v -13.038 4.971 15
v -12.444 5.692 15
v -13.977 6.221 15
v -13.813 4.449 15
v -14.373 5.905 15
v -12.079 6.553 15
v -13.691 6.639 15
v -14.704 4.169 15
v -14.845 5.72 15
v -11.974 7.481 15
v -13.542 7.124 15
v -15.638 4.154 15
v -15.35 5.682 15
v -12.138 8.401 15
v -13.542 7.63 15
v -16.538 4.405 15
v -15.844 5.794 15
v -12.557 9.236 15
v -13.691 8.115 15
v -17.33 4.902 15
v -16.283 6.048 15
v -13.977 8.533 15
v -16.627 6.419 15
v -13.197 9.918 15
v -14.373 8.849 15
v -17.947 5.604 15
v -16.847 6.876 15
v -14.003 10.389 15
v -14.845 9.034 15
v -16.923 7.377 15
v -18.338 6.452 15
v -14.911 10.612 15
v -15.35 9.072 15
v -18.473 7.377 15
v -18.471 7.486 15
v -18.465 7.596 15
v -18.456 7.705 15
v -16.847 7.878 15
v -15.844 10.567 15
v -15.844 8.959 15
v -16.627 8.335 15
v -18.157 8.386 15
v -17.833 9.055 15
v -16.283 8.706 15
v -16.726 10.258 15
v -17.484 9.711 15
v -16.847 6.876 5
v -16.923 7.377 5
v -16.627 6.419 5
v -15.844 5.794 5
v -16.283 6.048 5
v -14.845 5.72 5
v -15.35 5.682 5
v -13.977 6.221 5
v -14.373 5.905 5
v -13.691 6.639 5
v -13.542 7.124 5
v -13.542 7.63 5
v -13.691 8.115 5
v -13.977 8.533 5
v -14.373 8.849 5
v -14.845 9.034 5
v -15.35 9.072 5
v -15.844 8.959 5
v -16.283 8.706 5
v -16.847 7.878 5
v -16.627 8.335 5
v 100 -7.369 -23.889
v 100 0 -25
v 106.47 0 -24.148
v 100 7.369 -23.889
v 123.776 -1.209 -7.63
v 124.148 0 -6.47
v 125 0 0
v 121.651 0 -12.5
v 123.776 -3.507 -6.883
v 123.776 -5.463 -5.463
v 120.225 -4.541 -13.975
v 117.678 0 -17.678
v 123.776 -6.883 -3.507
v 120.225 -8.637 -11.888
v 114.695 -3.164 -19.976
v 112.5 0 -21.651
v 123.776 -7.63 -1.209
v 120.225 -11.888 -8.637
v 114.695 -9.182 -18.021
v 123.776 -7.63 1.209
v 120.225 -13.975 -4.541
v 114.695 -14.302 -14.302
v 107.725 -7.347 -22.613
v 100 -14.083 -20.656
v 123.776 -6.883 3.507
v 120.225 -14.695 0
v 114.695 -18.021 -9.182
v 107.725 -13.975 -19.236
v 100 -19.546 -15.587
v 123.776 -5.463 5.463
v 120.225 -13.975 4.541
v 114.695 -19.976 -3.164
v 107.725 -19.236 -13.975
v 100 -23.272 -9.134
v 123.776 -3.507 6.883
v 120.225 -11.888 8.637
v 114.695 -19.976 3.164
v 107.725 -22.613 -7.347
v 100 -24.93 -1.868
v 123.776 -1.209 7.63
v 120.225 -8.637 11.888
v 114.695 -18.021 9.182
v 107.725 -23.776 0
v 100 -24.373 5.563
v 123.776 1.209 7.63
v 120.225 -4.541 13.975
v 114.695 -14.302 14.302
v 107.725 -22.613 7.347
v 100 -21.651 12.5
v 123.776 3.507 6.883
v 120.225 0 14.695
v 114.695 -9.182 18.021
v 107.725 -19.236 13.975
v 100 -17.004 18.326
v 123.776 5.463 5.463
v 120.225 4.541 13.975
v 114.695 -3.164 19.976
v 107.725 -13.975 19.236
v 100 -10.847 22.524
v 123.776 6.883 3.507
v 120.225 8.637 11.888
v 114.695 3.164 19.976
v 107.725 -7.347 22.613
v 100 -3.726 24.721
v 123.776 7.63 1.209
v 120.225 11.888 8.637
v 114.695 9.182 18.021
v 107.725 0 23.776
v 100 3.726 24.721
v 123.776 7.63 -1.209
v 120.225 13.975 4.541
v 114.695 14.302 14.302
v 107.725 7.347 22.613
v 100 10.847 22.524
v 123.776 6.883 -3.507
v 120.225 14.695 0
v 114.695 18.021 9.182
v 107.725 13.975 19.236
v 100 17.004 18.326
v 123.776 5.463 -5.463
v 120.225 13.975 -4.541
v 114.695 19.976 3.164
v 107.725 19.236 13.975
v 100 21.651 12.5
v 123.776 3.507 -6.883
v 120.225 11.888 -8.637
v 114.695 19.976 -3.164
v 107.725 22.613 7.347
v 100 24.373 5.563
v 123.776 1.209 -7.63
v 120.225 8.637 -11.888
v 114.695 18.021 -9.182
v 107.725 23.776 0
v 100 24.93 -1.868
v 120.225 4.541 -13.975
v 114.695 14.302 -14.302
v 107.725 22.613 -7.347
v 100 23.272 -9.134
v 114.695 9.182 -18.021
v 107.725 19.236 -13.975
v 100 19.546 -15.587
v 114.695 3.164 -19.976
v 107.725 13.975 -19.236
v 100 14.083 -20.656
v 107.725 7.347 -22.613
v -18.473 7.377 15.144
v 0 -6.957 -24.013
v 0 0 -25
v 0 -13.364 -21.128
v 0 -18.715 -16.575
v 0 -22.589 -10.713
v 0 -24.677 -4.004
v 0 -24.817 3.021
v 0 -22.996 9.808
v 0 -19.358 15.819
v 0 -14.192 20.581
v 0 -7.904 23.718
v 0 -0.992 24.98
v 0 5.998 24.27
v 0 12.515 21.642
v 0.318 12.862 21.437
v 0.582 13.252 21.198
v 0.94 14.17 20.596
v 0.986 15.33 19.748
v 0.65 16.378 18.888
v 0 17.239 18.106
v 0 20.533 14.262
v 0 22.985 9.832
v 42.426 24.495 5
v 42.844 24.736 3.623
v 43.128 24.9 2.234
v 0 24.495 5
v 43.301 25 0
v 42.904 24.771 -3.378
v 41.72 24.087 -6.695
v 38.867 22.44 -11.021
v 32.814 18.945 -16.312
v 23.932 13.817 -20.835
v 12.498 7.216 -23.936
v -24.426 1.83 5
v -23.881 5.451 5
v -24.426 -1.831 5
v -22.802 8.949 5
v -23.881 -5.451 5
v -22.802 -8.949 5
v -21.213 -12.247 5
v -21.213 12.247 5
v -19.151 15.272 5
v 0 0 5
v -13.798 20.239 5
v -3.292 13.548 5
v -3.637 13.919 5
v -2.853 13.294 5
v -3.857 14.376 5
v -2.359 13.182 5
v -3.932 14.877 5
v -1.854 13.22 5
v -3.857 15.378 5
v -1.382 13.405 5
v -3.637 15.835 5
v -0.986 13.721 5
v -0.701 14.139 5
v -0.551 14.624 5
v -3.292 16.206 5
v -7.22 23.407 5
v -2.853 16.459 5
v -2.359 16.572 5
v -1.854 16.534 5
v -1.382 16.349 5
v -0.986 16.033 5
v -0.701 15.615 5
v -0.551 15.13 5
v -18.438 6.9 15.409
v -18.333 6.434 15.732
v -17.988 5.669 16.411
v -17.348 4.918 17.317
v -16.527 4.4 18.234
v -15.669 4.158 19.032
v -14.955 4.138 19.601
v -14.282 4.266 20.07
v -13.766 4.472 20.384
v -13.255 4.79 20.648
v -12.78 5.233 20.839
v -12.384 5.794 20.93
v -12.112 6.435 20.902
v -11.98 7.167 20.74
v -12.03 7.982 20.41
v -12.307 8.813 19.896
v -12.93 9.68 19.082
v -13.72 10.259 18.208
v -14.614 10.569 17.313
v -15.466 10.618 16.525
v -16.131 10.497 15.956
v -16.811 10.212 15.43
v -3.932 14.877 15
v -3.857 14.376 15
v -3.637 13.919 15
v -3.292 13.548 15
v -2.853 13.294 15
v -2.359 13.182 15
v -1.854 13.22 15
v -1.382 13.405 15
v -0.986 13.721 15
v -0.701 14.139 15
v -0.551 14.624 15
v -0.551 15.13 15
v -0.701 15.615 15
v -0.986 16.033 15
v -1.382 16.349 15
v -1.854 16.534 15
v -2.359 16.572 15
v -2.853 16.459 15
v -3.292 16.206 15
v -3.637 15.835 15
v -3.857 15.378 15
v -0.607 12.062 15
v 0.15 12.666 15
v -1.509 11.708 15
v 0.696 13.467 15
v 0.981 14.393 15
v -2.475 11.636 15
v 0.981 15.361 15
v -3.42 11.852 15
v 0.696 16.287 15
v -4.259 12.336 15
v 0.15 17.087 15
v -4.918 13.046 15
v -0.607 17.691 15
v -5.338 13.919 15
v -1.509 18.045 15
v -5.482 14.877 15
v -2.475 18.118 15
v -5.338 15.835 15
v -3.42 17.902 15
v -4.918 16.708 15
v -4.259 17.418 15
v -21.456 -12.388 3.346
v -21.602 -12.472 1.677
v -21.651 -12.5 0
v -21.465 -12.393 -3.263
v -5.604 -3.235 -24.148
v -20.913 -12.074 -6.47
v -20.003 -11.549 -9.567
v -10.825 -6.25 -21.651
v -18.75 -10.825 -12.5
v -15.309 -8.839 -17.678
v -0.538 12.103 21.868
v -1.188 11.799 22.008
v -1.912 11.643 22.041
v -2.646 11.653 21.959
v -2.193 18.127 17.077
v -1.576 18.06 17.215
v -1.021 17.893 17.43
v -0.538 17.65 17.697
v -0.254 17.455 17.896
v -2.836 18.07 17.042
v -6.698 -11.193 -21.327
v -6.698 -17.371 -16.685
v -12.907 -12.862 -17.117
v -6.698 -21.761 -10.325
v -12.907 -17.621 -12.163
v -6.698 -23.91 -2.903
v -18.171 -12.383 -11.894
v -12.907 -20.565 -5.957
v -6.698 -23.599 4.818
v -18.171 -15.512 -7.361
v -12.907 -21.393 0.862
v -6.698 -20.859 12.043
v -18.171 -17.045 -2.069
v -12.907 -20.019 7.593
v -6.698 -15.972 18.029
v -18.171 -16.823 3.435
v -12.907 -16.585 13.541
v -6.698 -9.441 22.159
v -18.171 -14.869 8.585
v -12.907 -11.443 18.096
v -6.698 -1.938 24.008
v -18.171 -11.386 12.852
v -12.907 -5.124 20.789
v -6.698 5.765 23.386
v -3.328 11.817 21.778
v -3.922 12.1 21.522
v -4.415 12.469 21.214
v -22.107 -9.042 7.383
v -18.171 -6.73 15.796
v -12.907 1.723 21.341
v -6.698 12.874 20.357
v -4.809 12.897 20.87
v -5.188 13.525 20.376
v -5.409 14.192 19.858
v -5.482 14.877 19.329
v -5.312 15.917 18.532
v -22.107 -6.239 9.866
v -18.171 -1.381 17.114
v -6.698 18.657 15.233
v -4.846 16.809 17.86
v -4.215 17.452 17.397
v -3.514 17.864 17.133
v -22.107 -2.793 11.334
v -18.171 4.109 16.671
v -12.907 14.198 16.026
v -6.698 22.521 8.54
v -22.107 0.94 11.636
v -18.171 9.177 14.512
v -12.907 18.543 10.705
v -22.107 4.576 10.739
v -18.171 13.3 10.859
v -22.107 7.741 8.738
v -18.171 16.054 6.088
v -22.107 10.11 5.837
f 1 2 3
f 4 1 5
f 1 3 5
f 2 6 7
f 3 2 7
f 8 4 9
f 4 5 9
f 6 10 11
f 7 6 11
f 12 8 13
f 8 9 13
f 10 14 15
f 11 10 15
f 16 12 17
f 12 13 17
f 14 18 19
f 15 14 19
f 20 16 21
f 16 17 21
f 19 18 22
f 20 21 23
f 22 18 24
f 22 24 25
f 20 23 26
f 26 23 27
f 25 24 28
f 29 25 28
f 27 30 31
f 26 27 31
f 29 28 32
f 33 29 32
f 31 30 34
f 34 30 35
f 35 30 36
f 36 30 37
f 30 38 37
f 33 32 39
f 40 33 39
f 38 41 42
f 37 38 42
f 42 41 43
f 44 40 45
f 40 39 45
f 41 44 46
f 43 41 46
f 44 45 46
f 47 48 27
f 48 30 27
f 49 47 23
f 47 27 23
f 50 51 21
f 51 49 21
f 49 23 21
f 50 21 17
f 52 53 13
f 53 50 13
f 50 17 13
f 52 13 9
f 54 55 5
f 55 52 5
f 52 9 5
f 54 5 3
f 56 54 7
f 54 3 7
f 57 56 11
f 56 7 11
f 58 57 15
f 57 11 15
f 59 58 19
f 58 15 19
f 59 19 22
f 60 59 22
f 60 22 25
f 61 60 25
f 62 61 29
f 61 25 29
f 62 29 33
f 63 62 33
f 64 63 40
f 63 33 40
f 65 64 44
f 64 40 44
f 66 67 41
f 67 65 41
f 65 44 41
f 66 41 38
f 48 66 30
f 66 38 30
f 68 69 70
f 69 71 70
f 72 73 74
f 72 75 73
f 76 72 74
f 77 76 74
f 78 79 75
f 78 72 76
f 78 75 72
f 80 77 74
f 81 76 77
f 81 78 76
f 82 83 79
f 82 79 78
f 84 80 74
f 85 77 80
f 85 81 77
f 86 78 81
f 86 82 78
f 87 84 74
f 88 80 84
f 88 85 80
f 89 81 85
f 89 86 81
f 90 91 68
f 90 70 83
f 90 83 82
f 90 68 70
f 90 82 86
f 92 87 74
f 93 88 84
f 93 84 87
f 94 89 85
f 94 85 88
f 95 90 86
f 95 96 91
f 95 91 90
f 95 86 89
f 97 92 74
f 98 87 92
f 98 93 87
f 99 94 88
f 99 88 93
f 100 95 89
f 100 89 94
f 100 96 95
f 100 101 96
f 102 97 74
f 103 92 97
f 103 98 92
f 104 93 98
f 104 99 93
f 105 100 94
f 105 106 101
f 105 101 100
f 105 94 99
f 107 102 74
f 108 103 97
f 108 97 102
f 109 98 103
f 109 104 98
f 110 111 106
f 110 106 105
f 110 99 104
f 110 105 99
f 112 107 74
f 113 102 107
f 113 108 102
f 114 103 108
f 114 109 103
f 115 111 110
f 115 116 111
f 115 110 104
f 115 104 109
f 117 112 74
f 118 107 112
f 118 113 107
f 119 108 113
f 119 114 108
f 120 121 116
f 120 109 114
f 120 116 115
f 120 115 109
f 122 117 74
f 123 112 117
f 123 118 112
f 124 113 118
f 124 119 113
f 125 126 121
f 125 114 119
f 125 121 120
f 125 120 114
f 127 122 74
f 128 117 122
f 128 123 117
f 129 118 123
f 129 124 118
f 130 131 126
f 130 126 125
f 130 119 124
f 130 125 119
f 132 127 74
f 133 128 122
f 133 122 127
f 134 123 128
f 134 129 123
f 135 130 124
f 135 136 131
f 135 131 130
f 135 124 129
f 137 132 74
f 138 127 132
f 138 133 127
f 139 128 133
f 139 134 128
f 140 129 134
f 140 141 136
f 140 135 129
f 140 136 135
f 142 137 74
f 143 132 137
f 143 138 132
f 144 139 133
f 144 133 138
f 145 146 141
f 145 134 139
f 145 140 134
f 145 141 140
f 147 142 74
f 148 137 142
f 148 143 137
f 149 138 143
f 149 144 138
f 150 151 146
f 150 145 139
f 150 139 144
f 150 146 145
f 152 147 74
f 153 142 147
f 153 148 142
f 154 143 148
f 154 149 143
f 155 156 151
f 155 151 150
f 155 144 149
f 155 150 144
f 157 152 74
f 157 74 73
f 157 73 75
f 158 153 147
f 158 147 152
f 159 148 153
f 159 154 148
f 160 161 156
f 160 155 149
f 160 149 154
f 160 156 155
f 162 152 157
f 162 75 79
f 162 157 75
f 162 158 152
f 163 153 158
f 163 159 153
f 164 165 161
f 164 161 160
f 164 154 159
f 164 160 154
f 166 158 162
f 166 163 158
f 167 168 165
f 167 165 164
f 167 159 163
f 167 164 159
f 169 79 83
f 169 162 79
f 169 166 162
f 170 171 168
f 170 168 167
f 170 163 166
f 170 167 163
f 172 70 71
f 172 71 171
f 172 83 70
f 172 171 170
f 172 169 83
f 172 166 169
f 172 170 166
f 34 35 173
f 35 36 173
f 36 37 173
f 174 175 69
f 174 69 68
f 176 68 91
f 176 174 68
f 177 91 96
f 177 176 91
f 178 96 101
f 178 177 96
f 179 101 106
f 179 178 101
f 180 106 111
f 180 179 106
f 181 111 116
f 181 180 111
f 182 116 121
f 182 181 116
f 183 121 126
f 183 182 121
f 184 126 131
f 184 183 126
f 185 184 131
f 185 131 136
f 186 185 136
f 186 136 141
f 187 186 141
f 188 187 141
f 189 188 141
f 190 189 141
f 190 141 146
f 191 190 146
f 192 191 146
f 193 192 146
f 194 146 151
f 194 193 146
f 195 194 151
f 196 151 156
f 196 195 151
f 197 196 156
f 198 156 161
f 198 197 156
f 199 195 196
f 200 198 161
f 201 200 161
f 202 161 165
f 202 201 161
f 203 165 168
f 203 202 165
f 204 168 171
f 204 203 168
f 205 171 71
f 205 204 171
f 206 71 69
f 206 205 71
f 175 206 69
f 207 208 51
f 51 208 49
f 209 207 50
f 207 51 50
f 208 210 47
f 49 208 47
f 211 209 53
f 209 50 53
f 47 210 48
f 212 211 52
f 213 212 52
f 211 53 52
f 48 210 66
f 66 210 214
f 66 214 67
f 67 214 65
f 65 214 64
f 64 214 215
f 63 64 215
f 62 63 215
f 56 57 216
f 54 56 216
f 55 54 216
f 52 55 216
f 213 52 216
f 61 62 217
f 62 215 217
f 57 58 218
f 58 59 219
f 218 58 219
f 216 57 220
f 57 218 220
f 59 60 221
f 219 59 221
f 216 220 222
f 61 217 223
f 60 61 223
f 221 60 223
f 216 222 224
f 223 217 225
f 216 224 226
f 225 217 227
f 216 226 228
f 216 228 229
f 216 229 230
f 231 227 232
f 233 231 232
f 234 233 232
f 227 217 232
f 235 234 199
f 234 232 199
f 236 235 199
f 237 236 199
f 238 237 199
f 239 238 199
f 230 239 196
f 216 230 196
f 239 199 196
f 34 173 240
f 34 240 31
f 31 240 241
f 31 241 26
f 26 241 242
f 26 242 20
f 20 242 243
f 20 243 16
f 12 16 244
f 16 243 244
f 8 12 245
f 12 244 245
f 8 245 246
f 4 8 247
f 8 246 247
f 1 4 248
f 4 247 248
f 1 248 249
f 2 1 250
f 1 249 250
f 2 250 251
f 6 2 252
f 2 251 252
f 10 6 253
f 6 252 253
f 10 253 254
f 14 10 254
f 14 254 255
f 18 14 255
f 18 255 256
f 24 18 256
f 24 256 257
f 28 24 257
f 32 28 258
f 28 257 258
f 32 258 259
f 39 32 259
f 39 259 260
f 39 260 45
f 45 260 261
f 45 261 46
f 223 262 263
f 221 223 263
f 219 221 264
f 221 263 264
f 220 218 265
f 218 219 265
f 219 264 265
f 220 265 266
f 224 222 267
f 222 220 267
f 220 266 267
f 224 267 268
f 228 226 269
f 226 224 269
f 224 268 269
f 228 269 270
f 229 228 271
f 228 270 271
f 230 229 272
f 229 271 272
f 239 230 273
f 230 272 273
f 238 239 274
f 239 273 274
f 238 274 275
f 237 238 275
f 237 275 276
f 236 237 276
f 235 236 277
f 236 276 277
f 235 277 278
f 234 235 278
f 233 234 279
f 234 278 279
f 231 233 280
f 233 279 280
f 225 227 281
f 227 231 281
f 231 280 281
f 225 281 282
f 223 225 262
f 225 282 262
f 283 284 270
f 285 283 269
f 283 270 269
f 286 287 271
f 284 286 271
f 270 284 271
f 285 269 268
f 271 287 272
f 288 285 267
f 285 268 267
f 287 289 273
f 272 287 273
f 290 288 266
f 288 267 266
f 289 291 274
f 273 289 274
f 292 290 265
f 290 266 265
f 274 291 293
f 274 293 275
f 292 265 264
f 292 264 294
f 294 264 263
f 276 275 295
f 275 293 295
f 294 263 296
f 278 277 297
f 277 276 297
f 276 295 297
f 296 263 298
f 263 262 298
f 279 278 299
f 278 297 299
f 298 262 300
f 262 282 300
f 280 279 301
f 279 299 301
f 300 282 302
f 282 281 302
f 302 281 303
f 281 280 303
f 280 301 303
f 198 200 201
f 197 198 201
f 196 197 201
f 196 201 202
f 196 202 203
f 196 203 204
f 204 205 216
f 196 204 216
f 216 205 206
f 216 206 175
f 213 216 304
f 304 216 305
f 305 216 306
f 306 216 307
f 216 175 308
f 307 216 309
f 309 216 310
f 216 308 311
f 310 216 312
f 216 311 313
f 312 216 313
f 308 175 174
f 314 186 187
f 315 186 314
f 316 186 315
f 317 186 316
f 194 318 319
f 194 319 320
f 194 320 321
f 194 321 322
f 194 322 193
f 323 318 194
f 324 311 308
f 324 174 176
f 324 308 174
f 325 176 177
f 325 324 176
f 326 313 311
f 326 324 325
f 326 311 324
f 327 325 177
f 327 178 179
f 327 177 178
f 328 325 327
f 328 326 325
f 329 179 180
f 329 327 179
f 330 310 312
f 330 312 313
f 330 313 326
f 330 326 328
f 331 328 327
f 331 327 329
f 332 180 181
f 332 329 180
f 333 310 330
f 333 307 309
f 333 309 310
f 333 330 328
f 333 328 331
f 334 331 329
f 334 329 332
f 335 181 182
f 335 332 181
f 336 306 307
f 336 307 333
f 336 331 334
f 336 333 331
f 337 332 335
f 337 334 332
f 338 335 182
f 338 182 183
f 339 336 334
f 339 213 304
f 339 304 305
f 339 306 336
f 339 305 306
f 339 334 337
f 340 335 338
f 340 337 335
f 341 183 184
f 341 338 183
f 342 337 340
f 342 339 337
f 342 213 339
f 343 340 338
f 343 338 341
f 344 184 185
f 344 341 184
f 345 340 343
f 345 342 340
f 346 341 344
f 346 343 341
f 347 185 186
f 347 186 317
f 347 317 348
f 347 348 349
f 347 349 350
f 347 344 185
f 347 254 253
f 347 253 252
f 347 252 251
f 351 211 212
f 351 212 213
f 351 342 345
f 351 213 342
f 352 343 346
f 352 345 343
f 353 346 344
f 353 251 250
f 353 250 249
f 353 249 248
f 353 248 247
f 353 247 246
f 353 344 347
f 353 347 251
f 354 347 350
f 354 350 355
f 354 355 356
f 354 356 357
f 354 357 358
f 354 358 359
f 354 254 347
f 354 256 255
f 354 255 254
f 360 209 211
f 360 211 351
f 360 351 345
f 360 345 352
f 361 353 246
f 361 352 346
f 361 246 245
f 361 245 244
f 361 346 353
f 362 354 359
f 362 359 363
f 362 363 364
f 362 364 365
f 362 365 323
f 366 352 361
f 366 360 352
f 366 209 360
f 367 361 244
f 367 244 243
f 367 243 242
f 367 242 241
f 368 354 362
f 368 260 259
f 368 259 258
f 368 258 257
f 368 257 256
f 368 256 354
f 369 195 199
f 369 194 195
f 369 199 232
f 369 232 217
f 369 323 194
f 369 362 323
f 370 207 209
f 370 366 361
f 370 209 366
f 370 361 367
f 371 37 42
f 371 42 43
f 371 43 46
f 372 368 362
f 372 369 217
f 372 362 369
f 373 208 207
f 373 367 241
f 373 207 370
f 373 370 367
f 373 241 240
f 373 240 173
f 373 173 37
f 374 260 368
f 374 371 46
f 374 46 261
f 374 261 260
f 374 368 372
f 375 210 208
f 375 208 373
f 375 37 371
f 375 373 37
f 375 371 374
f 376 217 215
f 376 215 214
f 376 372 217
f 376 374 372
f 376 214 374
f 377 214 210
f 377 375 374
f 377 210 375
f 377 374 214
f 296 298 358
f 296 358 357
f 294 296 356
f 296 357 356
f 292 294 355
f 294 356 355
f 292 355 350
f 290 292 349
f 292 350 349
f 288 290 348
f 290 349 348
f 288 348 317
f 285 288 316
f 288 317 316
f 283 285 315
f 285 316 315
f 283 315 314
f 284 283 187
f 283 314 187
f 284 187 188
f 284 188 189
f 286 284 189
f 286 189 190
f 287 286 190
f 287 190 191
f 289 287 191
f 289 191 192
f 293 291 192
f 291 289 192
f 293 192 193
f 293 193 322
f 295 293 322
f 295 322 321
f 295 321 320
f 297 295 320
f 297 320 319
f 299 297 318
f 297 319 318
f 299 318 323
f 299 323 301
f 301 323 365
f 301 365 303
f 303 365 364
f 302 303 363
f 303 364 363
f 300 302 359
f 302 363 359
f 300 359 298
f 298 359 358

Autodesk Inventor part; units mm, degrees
ref_plane "YZ Plane" through (0, 0, 0) normal (1, 0, 0) x (0, 1, 0)
sketch "Esquisse1" plane through (0, 0, 0) normal (0, 1, 0) x (-1, 0, 0)
  line L0 (0, 0) -> (-100, 0)
  line L1 (-100, 0) -> (-100, -25)
  line L2 (-100, -25) -> (0, -25)
  line L3 (0, -25) -> (0, 0)
  arc A0 (0, -25) -> (25, 0) centre (0, 0) ccw
  line L4 (25, 0) -> (0, 0)
  line L5 (0, 0) -> (0, -25)
  line L6 (-100, 0) -> (-100, -25)
  arc A1 (-125, 0) -> (-100, -25) centre (-100, 0) ccw
  line L7 (-100, 0) -> (-125, 0)
  dimension "d1" = 25
  dimension "d2" = 100
revolve "Révolution1" add sketch "Esquisse1" angle 360 about axis through (0, 0, 0) along (1, 0, 0)
ref_plane "Plan de construction1" through (50, 0, -25) normal (0, 0, 1) x (1, 0, 0)
sketch "Esquisse2" plane through (50, 0, -25) normal (0, 0, 1) x (1, 0, 0)
  arc A0 (-50, 25) -> (-50, -25) centre (-50, 0) ccw projected
  line L0 (-50, 0) -> (-71.6506, -12.5)
  line L1 (-71.6506, -12.5) -> (-84.1506, 9.1506)
  line L2 (-84.1506, 9.1506) -> (-62.5, 21.6506)
  line L3 (-62.5, 21.6506) -> (-50, 0)
  line L4 (-50, 0) -> (-31.3481, 0) construction
  line L5 (-50, 0) -> (-62.5, 21.6506)
  line L6 (-62.5, 21.6506) -> (-19.1987, 46.6506)
  line L7 (-19.1987, 46.6506) -> (-6.6987, 25)
  line L8 (-6.6987, 25) -> (-50, 0)
  line L9 (-50, -25) -> (-50, 25) construction
  line L10 (-50, 25) -> (75, 25) construction
  line L11 (-50, 25) -> (50, 25) construction
  dimension "d9" = 120
extrude "Extrusion1" cut sketch "Esquisse2" along normal blind 30
ref_plane "Plan de construction2" through (50, 0, 35) normal (0, 0, -1) x (-1, 0, 0)
sketch "Esquisse3" plane through (50, 0, 35) normal (0, 0, -1) x (-1, 0, 0)
  line L0 (50, 0) -> (71.2132, -12.2474) construction
  line L1 (71.2132, -12.2474) -> (50, 0) construction
  line L2 (50, 0) -> (50, 0) construction
  line L3 (65.2228, 7.3769) -> (52.2324, 14.8769) construction
  circle A0 centre (65.2228, 7.3769) radius 1.7
  circle A1 centre (52.2324, 14.8769) radius 1.7
  line L4 (71.2132, -12.2474) -> (93.5005, 26.3552) construction
  line L5 (52.2324, 14.8769) -> (45.2324, 2.7526) construction
  line L6 (6.6987, 25) -> (-50, 25) construction
  dimension "d12" = 14
  dimension "d22" = 3.4
  dimension "d23" = 3.4
  dimension "d30" = 15
  dimension "d31" = 30
extrude "Extrusion2" cut sketch "Esquisse3" along normal blind 30
sketch "Esquisse4" plane through (50, 0, 35) normal (0, 0, -1) x (-1, 0, 0)
  circle A0 centre (65.2228, 7.3769) radius 1.7 projected
  circle A1 centre (65.2228, 7.3769) radius 3.25
  circle A2 centre (52.2324, 14.8769) radius 1.7 projected
  circle A3 centre (52.2324, 14.8769) radius 3.25
  point P0 (50, 0)
  dimension "d26" = 6.5
  dimension "d27" = 6.5
extrude "Extrusion3" cut sketch "Esquisse4" along normal blind 20
equation "\"d23\" = d22"
equation "\"d27\" = d26"
properties part number "P1704_003_mainGauche"
